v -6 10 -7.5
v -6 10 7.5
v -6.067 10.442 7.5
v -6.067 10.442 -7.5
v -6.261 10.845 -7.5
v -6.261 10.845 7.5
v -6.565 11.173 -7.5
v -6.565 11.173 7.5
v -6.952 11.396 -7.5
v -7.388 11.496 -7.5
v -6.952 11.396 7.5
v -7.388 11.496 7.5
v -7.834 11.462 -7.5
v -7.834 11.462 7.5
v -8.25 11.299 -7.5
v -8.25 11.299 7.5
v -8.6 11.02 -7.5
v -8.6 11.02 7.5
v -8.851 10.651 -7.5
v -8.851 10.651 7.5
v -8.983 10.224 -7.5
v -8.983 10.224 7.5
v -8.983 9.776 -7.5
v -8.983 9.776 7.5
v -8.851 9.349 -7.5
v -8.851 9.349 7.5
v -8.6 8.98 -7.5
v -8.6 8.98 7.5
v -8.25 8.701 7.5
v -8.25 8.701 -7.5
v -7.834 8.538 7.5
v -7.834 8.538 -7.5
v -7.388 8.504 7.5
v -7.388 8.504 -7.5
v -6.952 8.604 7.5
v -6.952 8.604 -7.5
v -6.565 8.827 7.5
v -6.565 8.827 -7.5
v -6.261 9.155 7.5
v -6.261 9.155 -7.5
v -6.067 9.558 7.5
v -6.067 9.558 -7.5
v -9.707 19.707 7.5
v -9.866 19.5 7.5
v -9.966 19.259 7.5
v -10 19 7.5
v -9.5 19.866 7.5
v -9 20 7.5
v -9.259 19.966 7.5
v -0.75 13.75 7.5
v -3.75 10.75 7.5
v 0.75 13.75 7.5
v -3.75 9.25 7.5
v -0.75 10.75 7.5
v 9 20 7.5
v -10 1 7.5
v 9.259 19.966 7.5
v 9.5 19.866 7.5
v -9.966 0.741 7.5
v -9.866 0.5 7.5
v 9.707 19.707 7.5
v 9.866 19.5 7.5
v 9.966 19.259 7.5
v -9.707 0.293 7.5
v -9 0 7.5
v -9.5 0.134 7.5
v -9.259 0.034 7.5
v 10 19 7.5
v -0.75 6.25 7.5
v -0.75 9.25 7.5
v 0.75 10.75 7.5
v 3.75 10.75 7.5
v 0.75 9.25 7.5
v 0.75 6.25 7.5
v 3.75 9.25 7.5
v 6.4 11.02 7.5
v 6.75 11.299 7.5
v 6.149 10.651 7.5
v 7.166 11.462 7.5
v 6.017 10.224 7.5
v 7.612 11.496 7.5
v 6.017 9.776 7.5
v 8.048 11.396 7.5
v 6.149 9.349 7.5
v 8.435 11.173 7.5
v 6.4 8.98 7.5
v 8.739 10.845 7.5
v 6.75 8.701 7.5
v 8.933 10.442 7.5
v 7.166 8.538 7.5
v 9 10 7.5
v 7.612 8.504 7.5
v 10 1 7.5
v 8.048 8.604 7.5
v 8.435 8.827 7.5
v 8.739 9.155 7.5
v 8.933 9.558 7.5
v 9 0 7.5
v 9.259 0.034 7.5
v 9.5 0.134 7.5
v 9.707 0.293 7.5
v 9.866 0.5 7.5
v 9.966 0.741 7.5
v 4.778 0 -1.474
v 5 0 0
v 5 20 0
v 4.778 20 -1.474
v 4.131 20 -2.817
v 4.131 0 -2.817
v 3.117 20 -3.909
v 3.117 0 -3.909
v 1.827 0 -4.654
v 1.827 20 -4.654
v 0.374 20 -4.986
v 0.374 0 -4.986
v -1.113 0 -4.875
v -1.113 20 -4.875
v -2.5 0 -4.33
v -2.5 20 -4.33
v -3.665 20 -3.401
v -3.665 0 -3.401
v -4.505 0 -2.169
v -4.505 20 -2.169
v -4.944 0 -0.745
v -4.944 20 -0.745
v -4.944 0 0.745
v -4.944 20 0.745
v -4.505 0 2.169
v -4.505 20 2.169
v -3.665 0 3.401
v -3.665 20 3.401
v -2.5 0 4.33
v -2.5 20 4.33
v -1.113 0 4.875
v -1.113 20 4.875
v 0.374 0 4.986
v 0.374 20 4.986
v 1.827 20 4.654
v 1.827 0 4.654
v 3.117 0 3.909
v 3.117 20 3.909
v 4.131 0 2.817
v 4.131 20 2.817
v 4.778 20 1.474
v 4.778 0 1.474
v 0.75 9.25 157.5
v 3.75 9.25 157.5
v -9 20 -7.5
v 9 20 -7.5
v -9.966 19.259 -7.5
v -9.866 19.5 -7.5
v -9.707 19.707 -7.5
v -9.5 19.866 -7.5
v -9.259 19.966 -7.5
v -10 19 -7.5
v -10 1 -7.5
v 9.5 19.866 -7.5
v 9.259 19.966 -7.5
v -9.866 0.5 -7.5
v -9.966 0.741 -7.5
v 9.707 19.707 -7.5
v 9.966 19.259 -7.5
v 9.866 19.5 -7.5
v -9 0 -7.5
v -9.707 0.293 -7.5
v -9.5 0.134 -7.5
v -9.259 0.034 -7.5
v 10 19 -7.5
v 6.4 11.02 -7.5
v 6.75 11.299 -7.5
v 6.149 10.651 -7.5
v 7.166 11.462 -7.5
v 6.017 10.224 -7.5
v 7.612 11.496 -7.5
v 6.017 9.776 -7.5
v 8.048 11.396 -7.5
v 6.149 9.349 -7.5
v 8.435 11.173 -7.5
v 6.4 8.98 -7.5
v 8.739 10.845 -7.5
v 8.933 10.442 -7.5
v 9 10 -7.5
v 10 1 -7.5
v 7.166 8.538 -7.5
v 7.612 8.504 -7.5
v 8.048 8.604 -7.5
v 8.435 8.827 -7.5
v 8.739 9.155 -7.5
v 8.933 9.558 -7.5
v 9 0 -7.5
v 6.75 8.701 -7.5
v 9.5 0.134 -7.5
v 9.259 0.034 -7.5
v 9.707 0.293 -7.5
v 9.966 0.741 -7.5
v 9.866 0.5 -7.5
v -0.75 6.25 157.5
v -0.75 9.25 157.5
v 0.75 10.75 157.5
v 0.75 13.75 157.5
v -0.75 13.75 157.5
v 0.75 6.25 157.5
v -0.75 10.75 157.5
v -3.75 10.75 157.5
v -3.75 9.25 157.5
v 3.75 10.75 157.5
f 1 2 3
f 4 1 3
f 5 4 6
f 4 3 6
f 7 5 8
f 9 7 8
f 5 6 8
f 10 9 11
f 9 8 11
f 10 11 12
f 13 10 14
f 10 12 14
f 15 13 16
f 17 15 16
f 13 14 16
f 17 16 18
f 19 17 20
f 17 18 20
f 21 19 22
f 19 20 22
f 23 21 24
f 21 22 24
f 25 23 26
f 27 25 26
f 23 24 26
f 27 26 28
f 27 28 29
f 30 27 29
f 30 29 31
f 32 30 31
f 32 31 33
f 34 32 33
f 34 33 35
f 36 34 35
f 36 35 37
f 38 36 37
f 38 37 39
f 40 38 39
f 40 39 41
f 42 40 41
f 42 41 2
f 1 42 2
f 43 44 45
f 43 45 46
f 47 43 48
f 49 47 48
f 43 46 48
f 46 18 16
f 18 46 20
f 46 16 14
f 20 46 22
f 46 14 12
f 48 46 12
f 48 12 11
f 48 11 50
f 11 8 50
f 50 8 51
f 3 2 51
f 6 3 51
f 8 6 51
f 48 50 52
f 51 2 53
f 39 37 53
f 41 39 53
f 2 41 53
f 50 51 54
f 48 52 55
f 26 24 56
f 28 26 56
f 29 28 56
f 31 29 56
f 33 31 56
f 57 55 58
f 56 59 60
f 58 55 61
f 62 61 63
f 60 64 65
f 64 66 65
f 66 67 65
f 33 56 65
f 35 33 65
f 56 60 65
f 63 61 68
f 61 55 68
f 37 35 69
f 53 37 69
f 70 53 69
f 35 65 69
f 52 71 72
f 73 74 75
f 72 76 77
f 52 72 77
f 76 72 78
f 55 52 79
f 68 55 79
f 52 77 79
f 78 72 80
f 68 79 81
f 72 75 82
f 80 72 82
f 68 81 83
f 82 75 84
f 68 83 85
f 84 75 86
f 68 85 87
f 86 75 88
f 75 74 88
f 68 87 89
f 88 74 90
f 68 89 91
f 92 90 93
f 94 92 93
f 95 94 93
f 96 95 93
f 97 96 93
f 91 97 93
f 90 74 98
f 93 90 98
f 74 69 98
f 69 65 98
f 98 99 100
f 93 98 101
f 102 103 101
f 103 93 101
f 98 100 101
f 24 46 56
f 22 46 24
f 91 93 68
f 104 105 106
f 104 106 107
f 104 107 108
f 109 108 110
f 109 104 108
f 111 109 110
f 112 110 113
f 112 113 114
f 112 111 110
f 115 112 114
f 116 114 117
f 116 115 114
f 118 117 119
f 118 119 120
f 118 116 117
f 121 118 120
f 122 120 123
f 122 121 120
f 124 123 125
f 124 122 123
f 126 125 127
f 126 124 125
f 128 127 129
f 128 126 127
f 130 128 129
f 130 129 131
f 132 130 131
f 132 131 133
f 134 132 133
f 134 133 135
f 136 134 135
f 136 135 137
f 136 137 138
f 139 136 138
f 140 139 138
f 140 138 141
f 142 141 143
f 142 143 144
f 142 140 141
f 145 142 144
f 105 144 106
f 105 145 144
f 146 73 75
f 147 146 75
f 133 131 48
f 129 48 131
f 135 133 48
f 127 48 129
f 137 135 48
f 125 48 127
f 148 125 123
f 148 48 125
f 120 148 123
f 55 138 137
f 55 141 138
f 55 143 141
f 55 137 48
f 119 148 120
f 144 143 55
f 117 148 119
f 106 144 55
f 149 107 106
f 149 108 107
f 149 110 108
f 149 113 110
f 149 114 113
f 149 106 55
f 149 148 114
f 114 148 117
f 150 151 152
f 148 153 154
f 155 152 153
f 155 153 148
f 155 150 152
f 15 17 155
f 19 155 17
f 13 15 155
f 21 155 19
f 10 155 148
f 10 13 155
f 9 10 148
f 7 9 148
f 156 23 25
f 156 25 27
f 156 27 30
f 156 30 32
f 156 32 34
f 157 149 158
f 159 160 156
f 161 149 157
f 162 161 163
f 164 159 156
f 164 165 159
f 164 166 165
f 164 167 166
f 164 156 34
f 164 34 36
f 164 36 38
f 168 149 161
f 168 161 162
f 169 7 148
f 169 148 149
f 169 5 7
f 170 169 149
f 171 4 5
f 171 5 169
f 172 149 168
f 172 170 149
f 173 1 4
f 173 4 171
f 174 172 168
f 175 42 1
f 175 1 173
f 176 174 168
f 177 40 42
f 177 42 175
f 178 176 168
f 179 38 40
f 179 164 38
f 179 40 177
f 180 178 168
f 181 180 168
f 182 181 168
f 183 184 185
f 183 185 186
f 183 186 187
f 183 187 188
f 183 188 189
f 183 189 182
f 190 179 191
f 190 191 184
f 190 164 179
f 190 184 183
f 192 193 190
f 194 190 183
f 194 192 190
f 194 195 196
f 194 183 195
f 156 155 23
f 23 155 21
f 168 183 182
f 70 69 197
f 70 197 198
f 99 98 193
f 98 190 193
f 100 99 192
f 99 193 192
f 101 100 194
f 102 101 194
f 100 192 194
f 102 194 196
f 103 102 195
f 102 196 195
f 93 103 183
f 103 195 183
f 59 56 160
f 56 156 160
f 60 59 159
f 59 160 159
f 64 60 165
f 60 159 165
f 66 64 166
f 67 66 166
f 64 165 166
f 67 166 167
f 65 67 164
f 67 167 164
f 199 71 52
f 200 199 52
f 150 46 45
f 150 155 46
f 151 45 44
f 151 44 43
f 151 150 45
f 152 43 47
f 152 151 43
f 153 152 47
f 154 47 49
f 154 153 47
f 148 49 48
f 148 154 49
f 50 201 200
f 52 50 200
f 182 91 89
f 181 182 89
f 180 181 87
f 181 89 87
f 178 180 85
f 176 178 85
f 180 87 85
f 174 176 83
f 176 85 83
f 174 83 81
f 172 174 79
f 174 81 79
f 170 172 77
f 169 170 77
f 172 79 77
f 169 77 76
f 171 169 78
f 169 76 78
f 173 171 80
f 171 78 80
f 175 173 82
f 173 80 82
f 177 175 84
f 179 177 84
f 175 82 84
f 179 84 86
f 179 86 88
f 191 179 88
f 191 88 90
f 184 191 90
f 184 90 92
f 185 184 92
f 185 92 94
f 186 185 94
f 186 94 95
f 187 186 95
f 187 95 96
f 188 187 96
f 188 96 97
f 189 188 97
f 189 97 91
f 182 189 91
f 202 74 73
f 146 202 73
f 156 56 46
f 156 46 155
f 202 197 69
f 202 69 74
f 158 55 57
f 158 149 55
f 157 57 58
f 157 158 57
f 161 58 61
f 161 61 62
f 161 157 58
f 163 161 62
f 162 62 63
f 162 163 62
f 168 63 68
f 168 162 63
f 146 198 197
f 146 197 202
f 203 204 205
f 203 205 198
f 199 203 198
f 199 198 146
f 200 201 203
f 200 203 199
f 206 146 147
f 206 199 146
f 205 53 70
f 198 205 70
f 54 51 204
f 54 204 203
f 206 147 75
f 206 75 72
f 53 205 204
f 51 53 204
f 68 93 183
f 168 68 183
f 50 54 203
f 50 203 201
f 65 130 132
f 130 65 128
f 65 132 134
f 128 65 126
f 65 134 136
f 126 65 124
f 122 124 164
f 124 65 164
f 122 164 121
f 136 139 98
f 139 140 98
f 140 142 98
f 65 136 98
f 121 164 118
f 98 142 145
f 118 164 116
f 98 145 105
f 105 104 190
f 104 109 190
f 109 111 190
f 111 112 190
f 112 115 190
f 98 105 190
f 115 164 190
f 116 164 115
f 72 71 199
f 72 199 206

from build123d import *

# Parameters (mm, degrees)
SKETCH1_W           = 20
SKETCH1_H           = 15
SKETCH1_R           = 5
BOSS_EXTRUDE1_DEPTH = 20
SKETCH2_R           = 1.5
CUT_EXTRUDE2_DEPTH  = 20
SKETCH4_W           = 1.5
SKETCH4_H           = 7.5
SKETCH4_W_2         = 7.5
SKETCH4_H_2         = 1.5
BOSS_EXTRUDE3_DEPTH = 150
FILLET3_R           = 1


with BuildPart() as part:
    # Sketch1 → Boss-Extrude1 (new body)
    with BuildSketch(Plane(origin=(0, 0, 0), x_dir=(1, 0, 0), z_dir=(0, 1, 0))):
        Rectangle(SKETCH1_W, SKETCH1_H)
        Circle(SKETCH1_R, mode=Mode.SUBTRACT)
    extrude(amount=BOSS_EXTRUDE1_DEPTH)

    # Sketch2 → Cut-Extrude2 (cut)
    with BuildSketch(Plane.XY.offset(7.5)):
        with Locations((7.5, 10)):
            Circle(SKETCH2_R)
        with Locations((-7.5, 10)):
            Circle(SKETCH2_R)
    extrude(amount=-CUT_EXTRUDE2_DEPTH, mode=Mode.SUBTRACT)

    # Sketch4 → Boss-Extrude3 (add)
    with BuildSketch(Plane.XY.offset(7.5)):
        with Locations((0, 10)):
            Rectangle(SKETCH4_W, SKETCH4_H)
        with Locations((0, 10)):
            Rectangle(SKETCH4_W_2, SKETCH4_H_2)
    extrude(amount=BOSS_EXTRUDE3_DEPTH)

    # Fillet3
    fillet3_edges = [part.edges().sort_by_distance(p)[0] for p in [
        (-10, 20, 0),
        (10, 20, 0),
        (-10, 0, 0),
        (10, 0, 0),
    ]]
    fillet(fillet3_edges, radius=FILLET3_R)


solid = part.part
